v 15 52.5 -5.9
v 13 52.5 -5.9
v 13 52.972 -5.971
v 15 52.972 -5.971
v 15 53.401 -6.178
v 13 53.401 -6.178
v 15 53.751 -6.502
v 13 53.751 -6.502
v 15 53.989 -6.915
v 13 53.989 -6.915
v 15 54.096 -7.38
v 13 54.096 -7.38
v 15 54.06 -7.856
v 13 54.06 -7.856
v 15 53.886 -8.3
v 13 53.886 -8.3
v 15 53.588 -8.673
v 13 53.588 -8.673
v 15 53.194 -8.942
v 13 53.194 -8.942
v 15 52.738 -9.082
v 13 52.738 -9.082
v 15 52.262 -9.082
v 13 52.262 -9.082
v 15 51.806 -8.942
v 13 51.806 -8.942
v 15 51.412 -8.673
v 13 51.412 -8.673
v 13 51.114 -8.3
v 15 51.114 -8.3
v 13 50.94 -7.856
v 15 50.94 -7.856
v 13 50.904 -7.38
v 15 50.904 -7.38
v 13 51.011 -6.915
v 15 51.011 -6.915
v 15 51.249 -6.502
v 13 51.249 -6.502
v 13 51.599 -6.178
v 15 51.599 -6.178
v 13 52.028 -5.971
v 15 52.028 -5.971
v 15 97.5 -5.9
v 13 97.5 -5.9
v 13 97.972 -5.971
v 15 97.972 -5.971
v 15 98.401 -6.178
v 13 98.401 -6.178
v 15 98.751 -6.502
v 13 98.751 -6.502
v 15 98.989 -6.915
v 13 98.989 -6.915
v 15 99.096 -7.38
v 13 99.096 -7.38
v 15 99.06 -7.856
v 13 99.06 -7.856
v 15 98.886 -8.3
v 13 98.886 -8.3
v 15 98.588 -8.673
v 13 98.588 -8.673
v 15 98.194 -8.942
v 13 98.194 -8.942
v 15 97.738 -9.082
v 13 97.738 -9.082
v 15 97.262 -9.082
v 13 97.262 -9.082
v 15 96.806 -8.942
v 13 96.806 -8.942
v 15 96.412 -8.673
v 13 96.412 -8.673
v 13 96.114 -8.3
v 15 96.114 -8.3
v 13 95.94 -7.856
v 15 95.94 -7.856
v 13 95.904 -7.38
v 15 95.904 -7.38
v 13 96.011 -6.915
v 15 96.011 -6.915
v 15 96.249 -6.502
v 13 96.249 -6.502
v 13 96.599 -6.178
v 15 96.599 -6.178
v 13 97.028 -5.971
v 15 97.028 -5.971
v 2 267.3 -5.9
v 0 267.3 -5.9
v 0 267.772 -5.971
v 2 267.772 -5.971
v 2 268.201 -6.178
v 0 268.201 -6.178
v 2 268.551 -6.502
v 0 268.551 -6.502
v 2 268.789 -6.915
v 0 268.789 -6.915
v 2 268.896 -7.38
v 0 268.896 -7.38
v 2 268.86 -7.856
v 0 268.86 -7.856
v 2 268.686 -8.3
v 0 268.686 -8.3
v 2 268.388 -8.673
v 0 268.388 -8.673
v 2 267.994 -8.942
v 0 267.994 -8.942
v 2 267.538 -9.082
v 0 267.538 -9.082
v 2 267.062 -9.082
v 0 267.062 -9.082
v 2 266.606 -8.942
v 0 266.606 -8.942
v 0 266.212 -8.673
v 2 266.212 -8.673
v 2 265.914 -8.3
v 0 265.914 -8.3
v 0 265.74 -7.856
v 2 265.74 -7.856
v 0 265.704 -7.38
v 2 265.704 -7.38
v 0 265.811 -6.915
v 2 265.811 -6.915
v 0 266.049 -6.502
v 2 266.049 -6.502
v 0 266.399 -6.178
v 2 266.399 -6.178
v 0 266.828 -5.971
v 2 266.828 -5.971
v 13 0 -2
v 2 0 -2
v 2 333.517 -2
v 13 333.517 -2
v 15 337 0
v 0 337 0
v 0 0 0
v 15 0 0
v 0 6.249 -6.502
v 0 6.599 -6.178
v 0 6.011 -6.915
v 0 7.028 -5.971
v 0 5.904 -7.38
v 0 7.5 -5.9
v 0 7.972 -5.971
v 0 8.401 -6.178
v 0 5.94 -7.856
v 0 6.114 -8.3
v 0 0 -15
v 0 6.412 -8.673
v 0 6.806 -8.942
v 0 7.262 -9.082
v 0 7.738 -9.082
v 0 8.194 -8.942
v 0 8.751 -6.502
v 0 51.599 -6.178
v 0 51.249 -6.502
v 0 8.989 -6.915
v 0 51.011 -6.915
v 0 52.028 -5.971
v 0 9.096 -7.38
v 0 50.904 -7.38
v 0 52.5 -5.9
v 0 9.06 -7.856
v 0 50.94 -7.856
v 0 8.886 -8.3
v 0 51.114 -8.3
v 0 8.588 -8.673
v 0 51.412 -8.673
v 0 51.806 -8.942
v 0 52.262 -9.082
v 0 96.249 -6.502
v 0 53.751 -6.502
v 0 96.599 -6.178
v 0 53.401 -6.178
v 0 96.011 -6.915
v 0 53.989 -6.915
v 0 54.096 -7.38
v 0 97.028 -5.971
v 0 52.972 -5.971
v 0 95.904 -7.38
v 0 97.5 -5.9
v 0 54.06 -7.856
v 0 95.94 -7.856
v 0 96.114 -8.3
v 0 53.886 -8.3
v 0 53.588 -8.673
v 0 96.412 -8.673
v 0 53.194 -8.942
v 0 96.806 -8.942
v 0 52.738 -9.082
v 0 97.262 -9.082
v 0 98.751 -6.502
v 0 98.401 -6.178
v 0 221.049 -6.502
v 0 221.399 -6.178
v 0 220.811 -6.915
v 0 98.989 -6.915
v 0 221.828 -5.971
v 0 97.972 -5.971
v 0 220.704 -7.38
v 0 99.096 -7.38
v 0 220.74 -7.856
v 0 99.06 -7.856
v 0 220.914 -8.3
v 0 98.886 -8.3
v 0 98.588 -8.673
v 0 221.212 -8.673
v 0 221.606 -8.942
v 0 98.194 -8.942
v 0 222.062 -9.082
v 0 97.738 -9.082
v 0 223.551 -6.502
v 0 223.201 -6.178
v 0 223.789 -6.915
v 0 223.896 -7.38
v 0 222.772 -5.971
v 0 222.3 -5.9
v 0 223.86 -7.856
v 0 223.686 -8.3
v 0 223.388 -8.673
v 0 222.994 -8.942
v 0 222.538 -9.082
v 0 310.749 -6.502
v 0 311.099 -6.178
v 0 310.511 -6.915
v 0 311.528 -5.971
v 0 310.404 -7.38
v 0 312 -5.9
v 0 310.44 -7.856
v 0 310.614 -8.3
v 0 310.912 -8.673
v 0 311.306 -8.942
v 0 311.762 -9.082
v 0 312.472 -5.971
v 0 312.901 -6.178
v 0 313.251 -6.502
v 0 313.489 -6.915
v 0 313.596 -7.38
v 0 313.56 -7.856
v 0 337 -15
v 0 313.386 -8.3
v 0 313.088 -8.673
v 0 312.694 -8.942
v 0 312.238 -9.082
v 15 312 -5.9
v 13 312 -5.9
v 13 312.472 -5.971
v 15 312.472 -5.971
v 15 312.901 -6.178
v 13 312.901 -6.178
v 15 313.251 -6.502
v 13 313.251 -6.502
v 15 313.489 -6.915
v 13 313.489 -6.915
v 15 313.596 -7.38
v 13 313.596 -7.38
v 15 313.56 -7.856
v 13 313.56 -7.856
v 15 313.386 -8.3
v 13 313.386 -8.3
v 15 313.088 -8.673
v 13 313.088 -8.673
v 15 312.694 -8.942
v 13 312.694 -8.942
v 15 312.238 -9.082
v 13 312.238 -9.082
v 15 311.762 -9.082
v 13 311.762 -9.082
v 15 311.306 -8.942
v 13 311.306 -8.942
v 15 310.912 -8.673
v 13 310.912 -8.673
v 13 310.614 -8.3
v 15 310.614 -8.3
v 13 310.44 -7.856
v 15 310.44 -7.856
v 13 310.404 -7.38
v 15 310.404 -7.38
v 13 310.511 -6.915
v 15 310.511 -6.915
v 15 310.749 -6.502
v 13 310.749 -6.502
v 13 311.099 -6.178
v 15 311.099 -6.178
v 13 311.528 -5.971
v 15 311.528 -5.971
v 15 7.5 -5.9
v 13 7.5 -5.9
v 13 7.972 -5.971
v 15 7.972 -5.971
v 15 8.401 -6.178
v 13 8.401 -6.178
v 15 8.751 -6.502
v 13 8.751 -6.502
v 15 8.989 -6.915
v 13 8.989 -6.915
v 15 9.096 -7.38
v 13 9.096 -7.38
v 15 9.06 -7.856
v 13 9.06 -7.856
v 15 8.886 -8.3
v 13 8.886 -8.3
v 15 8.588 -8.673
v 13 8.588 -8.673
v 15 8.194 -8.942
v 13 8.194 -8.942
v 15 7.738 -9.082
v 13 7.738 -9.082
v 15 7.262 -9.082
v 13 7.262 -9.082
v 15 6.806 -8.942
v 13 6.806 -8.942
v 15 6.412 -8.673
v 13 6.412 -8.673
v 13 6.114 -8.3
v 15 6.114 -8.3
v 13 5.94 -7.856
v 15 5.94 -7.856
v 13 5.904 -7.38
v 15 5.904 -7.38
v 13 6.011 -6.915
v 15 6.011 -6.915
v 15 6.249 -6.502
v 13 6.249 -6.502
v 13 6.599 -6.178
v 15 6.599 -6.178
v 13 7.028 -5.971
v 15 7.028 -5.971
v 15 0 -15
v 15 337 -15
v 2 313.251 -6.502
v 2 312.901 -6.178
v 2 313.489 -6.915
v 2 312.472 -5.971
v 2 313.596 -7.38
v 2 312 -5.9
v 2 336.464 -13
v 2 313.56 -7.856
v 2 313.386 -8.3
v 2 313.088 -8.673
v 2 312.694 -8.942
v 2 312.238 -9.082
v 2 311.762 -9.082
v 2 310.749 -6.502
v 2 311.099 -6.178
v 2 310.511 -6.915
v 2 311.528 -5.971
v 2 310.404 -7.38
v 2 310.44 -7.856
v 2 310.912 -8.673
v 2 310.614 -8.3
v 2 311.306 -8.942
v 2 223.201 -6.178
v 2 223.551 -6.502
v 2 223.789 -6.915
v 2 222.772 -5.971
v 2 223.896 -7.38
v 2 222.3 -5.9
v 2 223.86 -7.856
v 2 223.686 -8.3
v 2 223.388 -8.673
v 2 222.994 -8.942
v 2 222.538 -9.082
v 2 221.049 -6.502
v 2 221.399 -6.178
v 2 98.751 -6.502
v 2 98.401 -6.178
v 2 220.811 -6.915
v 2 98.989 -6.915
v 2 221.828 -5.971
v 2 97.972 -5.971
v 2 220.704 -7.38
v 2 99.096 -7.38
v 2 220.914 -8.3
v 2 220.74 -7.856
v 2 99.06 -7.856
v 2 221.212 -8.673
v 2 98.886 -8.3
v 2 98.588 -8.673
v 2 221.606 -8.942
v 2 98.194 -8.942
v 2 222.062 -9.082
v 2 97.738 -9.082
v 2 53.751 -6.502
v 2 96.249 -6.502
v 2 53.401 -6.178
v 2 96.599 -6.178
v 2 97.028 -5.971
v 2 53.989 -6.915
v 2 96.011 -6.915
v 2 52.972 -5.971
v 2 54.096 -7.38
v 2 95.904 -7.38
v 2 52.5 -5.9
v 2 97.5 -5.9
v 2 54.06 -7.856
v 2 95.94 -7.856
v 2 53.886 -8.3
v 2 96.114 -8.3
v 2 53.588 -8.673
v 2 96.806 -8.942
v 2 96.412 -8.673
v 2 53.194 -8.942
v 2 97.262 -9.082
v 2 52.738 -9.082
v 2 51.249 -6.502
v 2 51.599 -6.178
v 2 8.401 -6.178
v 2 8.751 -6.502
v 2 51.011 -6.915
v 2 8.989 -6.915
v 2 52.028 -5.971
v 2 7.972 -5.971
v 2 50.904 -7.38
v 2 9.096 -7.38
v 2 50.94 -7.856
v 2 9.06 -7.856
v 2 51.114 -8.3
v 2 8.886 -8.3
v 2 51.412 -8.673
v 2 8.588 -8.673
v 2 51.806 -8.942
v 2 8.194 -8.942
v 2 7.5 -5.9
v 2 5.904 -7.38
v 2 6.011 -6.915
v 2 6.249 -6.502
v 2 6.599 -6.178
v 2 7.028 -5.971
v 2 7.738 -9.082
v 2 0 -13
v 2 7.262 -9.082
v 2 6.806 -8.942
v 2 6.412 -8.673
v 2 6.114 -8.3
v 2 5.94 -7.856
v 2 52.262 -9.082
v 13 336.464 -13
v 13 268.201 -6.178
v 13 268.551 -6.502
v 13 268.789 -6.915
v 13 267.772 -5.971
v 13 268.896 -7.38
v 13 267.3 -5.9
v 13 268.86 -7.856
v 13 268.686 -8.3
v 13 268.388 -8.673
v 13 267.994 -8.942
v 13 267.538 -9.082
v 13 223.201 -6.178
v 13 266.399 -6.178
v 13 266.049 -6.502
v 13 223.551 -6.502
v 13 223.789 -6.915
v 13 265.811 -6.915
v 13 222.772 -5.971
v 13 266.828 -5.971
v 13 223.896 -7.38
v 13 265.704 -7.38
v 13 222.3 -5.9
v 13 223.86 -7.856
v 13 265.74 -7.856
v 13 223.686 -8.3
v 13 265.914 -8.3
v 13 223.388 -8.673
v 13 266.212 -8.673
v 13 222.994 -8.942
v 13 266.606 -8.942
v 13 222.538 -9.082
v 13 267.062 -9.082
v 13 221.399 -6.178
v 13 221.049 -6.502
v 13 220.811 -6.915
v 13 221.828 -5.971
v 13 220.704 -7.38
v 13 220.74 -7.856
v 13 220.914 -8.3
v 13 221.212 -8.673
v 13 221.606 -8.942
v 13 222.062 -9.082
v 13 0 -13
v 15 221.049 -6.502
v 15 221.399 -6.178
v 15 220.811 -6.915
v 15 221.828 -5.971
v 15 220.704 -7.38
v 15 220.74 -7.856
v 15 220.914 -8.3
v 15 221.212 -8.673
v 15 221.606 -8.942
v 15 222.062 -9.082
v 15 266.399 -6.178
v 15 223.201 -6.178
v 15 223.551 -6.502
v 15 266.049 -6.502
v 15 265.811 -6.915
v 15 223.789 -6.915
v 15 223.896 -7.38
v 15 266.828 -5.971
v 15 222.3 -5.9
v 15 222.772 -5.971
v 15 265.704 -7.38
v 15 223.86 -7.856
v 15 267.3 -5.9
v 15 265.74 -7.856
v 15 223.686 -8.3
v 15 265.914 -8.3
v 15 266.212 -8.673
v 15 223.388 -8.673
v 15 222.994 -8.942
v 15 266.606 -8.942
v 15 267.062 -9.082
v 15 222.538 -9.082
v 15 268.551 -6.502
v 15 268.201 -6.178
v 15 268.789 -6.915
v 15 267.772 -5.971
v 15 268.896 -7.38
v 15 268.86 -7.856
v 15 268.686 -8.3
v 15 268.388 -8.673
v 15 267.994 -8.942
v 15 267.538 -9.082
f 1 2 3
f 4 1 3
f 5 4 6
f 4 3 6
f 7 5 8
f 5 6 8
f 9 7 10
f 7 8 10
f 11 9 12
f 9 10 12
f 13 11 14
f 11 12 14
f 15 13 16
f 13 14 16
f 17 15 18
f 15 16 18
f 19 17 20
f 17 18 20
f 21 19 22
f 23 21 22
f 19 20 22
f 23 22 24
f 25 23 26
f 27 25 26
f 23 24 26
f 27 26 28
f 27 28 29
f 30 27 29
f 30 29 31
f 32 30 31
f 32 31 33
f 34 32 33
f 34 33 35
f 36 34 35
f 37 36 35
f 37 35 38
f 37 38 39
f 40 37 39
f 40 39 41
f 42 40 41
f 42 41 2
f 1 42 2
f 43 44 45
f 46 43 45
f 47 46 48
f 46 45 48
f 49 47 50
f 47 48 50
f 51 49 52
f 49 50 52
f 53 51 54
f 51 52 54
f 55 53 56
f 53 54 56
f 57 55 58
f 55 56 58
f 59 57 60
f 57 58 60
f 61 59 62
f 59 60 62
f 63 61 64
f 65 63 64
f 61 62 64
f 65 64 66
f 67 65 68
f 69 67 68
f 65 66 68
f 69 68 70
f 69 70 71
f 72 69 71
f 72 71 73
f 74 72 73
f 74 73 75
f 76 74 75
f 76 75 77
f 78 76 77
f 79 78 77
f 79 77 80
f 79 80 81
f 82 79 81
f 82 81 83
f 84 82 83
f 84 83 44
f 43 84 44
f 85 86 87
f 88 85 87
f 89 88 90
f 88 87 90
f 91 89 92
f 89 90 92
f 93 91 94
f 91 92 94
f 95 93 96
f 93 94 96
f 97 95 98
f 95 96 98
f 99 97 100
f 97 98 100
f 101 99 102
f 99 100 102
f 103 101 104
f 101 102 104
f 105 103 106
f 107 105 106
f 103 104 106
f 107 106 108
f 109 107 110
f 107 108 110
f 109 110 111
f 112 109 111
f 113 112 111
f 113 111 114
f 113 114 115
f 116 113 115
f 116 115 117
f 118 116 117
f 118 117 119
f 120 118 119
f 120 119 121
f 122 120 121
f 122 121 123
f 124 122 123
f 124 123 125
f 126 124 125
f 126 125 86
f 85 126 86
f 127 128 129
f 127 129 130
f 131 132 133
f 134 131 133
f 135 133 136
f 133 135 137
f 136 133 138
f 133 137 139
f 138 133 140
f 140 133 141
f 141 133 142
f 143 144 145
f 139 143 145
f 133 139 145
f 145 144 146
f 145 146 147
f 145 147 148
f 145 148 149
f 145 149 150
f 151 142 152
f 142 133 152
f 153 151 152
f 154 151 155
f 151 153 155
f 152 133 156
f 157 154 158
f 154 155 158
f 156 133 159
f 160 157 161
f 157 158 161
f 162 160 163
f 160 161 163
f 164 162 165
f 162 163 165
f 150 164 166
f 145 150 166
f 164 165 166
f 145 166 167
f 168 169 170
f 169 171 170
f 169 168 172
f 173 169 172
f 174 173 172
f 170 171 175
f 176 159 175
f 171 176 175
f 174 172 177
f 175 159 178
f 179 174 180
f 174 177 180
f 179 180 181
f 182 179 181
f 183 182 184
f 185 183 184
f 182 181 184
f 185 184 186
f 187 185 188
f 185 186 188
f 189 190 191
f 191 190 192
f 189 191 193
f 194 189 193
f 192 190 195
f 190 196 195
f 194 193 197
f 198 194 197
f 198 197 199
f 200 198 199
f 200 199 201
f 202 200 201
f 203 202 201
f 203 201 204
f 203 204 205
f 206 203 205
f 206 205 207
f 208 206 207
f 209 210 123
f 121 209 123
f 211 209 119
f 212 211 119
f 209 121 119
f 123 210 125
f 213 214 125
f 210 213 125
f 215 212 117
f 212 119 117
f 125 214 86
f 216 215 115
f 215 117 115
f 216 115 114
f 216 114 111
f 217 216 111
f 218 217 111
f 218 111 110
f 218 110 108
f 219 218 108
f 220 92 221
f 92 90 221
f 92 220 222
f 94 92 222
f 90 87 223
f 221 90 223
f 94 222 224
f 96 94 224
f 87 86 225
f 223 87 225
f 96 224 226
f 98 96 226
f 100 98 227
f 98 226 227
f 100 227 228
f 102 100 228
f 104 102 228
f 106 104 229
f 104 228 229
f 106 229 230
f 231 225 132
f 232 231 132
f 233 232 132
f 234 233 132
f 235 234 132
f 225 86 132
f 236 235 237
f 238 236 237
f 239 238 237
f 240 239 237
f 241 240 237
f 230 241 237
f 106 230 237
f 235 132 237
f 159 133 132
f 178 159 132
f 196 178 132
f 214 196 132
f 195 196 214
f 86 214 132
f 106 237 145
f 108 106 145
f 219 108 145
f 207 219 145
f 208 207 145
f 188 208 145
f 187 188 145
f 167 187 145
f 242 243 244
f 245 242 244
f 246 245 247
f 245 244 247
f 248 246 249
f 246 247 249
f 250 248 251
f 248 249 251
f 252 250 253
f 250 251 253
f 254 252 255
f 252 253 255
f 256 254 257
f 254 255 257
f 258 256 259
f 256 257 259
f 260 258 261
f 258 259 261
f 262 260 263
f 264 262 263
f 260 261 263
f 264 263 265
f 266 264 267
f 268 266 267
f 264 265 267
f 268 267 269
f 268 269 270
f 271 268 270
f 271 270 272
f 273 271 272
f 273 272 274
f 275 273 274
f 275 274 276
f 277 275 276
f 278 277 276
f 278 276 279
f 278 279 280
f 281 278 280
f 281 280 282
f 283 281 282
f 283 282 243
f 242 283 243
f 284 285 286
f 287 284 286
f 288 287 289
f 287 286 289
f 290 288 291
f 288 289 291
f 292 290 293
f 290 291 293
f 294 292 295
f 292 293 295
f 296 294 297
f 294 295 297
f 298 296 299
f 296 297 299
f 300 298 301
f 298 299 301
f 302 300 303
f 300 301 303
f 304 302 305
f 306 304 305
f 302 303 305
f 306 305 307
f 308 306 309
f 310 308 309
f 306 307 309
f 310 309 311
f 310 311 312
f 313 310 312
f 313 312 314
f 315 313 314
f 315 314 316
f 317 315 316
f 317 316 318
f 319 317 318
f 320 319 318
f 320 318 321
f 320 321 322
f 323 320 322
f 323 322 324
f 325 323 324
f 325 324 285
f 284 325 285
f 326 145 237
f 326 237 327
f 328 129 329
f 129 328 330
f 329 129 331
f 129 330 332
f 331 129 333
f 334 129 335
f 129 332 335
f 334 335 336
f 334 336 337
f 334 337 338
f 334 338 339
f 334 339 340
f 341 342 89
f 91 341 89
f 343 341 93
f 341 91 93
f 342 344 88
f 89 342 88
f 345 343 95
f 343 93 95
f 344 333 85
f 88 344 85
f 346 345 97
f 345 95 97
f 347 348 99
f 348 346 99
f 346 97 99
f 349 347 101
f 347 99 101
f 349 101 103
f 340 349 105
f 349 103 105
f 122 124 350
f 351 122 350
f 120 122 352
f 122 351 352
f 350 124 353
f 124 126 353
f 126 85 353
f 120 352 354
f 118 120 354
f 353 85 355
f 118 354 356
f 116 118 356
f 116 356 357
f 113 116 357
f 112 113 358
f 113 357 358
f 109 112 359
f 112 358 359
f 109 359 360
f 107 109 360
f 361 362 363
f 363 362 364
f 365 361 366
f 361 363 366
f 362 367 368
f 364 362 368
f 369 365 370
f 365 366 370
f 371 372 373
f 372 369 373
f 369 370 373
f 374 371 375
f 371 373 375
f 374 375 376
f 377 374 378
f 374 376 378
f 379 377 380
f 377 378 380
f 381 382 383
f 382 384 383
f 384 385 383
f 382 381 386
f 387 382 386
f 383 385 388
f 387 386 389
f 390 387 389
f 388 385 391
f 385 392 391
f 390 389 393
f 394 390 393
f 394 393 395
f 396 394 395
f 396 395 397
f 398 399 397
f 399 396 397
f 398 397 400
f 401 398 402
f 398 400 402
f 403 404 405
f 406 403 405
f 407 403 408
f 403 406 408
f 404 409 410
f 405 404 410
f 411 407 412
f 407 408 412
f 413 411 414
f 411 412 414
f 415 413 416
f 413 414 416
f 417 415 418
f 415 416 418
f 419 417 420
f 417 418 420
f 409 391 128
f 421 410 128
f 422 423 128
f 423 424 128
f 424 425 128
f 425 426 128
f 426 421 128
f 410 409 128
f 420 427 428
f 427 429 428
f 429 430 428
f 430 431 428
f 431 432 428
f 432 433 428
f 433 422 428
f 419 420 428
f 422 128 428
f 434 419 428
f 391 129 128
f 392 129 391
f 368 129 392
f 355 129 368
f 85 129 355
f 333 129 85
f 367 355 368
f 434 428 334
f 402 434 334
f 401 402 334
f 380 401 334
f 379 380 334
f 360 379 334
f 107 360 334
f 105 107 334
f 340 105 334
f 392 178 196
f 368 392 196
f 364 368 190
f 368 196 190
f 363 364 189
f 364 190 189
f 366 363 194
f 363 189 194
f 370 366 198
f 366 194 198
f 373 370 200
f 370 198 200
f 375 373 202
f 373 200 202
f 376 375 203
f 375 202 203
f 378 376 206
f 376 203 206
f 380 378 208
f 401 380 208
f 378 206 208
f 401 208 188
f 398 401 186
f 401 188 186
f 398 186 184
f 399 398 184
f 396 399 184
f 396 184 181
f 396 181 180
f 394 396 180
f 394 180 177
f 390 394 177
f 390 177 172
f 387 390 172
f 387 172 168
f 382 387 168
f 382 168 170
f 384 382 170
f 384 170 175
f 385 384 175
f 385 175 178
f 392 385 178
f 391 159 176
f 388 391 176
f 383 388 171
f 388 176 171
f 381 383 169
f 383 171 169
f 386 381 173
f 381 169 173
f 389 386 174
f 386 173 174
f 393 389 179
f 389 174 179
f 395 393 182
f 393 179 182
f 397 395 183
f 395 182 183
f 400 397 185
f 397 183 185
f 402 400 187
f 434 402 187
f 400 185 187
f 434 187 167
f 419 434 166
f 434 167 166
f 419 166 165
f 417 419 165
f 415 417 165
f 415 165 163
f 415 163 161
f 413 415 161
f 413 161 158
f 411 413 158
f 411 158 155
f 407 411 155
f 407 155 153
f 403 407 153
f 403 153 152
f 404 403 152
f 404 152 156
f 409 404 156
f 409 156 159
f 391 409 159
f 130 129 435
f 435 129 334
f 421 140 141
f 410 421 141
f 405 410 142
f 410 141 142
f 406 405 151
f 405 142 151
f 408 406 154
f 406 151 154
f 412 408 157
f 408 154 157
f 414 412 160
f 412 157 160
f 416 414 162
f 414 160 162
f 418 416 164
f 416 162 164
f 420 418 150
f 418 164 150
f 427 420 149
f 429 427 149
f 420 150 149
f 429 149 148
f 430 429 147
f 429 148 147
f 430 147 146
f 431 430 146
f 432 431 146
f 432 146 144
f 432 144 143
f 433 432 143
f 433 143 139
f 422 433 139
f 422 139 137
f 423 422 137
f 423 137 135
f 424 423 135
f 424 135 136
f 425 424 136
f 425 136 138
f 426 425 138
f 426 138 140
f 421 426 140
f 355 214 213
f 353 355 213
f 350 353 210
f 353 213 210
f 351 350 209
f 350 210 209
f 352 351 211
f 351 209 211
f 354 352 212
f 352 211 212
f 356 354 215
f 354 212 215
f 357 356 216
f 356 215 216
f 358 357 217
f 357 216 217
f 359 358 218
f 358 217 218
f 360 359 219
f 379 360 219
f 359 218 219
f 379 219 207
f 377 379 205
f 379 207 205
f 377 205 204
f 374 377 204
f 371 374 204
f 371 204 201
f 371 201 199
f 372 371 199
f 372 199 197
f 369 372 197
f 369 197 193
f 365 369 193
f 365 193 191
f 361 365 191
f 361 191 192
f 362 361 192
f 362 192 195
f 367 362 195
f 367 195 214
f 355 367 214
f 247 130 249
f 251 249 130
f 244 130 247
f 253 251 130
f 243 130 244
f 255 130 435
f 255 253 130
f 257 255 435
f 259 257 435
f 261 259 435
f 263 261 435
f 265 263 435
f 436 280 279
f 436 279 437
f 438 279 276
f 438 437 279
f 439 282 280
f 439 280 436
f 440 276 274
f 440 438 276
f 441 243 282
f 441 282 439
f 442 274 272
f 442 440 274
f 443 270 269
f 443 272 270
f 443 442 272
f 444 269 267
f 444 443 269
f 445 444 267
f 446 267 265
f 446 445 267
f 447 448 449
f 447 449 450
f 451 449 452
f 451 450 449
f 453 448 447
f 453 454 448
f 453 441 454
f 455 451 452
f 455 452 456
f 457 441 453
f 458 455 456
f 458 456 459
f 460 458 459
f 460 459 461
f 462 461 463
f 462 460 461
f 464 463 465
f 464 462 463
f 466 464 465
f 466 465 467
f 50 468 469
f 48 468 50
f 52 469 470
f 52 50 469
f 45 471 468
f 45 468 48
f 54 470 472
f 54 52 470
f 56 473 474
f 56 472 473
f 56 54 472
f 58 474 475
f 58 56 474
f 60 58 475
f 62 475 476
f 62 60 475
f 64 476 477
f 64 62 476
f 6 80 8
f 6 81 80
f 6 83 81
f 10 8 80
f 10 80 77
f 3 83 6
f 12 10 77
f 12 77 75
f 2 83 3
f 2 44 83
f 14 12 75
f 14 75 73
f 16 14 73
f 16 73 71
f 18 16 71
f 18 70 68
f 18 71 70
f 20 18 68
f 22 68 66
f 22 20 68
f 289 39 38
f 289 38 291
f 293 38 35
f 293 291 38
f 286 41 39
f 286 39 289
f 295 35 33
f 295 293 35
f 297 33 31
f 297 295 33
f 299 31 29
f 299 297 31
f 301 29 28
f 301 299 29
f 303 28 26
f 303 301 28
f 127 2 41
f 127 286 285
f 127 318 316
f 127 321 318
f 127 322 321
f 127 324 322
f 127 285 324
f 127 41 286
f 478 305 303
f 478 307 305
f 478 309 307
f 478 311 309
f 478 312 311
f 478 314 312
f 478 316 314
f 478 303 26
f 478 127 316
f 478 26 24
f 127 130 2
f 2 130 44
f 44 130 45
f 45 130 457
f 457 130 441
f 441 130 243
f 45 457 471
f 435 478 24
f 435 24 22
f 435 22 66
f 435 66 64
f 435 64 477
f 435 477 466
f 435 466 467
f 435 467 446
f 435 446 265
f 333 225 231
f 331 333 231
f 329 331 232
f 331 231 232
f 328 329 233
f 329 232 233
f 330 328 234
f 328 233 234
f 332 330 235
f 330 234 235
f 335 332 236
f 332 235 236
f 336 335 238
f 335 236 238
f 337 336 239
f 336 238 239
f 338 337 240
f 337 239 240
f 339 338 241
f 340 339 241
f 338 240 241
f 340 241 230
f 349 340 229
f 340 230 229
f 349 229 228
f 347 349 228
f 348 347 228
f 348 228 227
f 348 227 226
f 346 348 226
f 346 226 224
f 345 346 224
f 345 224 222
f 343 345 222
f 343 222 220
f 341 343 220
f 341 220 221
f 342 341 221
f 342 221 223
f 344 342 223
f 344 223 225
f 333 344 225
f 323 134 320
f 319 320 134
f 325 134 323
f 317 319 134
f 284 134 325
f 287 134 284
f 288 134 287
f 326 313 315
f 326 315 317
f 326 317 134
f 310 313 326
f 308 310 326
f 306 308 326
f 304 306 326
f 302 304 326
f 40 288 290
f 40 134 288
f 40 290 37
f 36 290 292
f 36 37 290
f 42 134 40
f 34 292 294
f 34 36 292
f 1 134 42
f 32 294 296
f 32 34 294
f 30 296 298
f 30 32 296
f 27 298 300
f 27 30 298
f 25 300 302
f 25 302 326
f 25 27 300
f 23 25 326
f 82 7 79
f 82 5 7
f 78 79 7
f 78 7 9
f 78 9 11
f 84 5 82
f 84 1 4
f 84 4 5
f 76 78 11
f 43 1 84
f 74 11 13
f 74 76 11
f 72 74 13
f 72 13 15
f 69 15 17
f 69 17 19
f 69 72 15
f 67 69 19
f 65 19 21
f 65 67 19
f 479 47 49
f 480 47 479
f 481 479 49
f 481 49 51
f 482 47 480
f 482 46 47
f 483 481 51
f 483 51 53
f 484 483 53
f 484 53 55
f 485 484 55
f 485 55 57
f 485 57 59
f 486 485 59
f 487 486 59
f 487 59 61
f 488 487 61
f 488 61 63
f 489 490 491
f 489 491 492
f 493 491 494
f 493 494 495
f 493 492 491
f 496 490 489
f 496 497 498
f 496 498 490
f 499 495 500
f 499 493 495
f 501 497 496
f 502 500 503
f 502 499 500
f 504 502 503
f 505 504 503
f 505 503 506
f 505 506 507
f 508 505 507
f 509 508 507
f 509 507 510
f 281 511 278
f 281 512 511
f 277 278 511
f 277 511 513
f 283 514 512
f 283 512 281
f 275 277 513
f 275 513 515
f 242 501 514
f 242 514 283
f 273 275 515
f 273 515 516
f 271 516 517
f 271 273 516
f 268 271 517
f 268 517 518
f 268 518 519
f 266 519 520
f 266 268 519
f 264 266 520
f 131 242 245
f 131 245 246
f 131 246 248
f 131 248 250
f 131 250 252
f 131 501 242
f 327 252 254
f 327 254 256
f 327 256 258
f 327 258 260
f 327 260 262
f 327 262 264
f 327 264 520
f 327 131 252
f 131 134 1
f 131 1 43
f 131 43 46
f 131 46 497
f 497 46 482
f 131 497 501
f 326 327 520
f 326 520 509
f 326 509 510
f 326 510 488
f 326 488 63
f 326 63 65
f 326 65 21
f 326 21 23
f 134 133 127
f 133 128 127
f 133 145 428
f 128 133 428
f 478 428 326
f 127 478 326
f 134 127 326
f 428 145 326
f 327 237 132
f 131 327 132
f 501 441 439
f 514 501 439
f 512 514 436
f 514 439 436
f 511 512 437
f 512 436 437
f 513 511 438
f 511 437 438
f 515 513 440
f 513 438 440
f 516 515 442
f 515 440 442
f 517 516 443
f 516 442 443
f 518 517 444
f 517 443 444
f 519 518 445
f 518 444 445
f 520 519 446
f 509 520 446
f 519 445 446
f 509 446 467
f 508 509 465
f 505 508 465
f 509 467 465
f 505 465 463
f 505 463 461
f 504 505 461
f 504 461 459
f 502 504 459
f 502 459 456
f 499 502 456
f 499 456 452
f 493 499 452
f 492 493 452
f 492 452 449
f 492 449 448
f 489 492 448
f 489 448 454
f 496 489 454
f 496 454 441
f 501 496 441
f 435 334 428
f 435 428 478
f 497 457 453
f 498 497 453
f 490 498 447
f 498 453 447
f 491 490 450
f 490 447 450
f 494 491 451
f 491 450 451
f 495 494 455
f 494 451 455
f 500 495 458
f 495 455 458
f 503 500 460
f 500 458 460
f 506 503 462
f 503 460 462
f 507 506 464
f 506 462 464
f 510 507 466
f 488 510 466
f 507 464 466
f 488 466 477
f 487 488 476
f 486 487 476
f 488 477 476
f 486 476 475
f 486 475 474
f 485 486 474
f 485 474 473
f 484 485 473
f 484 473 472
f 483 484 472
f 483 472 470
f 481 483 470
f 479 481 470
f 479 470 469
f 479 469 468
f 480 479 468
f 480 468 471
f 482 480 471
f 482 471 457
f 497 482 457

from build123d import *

# Parameters (mm, degrees)
SKETCH1_W           = 15
SKETCH1_H           = 15
SKETCH1_W_2         = 11
SKETCH1_H_2         = 11
BOSS_EXTRUDE1_DEPTH = 337
CUT_EXTRUDE1_DEPTH  = 338.666995722
SKETCH3_R           = 1.6
CUT_EXTRUDE2_DEPTH  = 338.666995722
BOSS_EXTRUDE2_DEPTH = 15


with BuildPart() as part:
    # Sketch1 → Boss-Extrude1 (new body)
    with BuildSketch(Plane(origin=(0, 0, 0), x_dir=(1, 0, 0), z_dir=(0, 1, 0))):
        with Locations((7.5, 7.5)):
            Rectangle(SKETCH1_W, SKETCH1_H)
        with Locations((7.5, 7.5)):
            Rectangle(SKETCH1_W_2, SKETCH1_H_2, mode=Mode.SUBTRACT)
    extrude(amount=BOSS_EXTRUDE1_DEPTH)

    # Sketch2 → Cut-Extrude1 (cut, through all)
    with BuildSketch(Plane(origin=(15, 0, 0), x_dir=(0, 0, -1), z_dir=(1, 0, 0))):
        Polygon((15, 337), (0, 332.980762114), (0, 337), align=None)
    extrude(amount=-CUT_EXTRUDE1_DEPTH, mode=Mode.SUBTRACT)

    # Sketch3 → Cut-Extrude2 (cut, through all)
    with BuildSketch(Plane.ZY):
        with Locations((-7.5, 7.5)):
            Circle(SKETCH3_R)
        with Locations((-7.5, 312)):
            Circle(SKETCH3_R)
        with Locations((-7.5, 267.3)):
            Circle(SKETCH3_R)
        with Locations((-7.5, 52.5)):
            Circle(SKETCH3_R)
        with Locations((-7.5, 97.5)):
            Circle(SKETCH3_R)
        with Locations((-7.5, 222.3)):
            Circle(SKETCH3_R)
    extrude(amount=-CUT_EXTRUDE2_DEPTH, mode=Mode.SUBTRACT)

    # Sketch4 → Boss-Extrude2 (add)
    with BuildSketch(Plane.ZY):
        Polygon((-15, 337), (0, 337), (0, 332.980762114), align=None)
    extrude(amount=-BOSS_EXTRUDE2_DEPTH)


solid = part.part
